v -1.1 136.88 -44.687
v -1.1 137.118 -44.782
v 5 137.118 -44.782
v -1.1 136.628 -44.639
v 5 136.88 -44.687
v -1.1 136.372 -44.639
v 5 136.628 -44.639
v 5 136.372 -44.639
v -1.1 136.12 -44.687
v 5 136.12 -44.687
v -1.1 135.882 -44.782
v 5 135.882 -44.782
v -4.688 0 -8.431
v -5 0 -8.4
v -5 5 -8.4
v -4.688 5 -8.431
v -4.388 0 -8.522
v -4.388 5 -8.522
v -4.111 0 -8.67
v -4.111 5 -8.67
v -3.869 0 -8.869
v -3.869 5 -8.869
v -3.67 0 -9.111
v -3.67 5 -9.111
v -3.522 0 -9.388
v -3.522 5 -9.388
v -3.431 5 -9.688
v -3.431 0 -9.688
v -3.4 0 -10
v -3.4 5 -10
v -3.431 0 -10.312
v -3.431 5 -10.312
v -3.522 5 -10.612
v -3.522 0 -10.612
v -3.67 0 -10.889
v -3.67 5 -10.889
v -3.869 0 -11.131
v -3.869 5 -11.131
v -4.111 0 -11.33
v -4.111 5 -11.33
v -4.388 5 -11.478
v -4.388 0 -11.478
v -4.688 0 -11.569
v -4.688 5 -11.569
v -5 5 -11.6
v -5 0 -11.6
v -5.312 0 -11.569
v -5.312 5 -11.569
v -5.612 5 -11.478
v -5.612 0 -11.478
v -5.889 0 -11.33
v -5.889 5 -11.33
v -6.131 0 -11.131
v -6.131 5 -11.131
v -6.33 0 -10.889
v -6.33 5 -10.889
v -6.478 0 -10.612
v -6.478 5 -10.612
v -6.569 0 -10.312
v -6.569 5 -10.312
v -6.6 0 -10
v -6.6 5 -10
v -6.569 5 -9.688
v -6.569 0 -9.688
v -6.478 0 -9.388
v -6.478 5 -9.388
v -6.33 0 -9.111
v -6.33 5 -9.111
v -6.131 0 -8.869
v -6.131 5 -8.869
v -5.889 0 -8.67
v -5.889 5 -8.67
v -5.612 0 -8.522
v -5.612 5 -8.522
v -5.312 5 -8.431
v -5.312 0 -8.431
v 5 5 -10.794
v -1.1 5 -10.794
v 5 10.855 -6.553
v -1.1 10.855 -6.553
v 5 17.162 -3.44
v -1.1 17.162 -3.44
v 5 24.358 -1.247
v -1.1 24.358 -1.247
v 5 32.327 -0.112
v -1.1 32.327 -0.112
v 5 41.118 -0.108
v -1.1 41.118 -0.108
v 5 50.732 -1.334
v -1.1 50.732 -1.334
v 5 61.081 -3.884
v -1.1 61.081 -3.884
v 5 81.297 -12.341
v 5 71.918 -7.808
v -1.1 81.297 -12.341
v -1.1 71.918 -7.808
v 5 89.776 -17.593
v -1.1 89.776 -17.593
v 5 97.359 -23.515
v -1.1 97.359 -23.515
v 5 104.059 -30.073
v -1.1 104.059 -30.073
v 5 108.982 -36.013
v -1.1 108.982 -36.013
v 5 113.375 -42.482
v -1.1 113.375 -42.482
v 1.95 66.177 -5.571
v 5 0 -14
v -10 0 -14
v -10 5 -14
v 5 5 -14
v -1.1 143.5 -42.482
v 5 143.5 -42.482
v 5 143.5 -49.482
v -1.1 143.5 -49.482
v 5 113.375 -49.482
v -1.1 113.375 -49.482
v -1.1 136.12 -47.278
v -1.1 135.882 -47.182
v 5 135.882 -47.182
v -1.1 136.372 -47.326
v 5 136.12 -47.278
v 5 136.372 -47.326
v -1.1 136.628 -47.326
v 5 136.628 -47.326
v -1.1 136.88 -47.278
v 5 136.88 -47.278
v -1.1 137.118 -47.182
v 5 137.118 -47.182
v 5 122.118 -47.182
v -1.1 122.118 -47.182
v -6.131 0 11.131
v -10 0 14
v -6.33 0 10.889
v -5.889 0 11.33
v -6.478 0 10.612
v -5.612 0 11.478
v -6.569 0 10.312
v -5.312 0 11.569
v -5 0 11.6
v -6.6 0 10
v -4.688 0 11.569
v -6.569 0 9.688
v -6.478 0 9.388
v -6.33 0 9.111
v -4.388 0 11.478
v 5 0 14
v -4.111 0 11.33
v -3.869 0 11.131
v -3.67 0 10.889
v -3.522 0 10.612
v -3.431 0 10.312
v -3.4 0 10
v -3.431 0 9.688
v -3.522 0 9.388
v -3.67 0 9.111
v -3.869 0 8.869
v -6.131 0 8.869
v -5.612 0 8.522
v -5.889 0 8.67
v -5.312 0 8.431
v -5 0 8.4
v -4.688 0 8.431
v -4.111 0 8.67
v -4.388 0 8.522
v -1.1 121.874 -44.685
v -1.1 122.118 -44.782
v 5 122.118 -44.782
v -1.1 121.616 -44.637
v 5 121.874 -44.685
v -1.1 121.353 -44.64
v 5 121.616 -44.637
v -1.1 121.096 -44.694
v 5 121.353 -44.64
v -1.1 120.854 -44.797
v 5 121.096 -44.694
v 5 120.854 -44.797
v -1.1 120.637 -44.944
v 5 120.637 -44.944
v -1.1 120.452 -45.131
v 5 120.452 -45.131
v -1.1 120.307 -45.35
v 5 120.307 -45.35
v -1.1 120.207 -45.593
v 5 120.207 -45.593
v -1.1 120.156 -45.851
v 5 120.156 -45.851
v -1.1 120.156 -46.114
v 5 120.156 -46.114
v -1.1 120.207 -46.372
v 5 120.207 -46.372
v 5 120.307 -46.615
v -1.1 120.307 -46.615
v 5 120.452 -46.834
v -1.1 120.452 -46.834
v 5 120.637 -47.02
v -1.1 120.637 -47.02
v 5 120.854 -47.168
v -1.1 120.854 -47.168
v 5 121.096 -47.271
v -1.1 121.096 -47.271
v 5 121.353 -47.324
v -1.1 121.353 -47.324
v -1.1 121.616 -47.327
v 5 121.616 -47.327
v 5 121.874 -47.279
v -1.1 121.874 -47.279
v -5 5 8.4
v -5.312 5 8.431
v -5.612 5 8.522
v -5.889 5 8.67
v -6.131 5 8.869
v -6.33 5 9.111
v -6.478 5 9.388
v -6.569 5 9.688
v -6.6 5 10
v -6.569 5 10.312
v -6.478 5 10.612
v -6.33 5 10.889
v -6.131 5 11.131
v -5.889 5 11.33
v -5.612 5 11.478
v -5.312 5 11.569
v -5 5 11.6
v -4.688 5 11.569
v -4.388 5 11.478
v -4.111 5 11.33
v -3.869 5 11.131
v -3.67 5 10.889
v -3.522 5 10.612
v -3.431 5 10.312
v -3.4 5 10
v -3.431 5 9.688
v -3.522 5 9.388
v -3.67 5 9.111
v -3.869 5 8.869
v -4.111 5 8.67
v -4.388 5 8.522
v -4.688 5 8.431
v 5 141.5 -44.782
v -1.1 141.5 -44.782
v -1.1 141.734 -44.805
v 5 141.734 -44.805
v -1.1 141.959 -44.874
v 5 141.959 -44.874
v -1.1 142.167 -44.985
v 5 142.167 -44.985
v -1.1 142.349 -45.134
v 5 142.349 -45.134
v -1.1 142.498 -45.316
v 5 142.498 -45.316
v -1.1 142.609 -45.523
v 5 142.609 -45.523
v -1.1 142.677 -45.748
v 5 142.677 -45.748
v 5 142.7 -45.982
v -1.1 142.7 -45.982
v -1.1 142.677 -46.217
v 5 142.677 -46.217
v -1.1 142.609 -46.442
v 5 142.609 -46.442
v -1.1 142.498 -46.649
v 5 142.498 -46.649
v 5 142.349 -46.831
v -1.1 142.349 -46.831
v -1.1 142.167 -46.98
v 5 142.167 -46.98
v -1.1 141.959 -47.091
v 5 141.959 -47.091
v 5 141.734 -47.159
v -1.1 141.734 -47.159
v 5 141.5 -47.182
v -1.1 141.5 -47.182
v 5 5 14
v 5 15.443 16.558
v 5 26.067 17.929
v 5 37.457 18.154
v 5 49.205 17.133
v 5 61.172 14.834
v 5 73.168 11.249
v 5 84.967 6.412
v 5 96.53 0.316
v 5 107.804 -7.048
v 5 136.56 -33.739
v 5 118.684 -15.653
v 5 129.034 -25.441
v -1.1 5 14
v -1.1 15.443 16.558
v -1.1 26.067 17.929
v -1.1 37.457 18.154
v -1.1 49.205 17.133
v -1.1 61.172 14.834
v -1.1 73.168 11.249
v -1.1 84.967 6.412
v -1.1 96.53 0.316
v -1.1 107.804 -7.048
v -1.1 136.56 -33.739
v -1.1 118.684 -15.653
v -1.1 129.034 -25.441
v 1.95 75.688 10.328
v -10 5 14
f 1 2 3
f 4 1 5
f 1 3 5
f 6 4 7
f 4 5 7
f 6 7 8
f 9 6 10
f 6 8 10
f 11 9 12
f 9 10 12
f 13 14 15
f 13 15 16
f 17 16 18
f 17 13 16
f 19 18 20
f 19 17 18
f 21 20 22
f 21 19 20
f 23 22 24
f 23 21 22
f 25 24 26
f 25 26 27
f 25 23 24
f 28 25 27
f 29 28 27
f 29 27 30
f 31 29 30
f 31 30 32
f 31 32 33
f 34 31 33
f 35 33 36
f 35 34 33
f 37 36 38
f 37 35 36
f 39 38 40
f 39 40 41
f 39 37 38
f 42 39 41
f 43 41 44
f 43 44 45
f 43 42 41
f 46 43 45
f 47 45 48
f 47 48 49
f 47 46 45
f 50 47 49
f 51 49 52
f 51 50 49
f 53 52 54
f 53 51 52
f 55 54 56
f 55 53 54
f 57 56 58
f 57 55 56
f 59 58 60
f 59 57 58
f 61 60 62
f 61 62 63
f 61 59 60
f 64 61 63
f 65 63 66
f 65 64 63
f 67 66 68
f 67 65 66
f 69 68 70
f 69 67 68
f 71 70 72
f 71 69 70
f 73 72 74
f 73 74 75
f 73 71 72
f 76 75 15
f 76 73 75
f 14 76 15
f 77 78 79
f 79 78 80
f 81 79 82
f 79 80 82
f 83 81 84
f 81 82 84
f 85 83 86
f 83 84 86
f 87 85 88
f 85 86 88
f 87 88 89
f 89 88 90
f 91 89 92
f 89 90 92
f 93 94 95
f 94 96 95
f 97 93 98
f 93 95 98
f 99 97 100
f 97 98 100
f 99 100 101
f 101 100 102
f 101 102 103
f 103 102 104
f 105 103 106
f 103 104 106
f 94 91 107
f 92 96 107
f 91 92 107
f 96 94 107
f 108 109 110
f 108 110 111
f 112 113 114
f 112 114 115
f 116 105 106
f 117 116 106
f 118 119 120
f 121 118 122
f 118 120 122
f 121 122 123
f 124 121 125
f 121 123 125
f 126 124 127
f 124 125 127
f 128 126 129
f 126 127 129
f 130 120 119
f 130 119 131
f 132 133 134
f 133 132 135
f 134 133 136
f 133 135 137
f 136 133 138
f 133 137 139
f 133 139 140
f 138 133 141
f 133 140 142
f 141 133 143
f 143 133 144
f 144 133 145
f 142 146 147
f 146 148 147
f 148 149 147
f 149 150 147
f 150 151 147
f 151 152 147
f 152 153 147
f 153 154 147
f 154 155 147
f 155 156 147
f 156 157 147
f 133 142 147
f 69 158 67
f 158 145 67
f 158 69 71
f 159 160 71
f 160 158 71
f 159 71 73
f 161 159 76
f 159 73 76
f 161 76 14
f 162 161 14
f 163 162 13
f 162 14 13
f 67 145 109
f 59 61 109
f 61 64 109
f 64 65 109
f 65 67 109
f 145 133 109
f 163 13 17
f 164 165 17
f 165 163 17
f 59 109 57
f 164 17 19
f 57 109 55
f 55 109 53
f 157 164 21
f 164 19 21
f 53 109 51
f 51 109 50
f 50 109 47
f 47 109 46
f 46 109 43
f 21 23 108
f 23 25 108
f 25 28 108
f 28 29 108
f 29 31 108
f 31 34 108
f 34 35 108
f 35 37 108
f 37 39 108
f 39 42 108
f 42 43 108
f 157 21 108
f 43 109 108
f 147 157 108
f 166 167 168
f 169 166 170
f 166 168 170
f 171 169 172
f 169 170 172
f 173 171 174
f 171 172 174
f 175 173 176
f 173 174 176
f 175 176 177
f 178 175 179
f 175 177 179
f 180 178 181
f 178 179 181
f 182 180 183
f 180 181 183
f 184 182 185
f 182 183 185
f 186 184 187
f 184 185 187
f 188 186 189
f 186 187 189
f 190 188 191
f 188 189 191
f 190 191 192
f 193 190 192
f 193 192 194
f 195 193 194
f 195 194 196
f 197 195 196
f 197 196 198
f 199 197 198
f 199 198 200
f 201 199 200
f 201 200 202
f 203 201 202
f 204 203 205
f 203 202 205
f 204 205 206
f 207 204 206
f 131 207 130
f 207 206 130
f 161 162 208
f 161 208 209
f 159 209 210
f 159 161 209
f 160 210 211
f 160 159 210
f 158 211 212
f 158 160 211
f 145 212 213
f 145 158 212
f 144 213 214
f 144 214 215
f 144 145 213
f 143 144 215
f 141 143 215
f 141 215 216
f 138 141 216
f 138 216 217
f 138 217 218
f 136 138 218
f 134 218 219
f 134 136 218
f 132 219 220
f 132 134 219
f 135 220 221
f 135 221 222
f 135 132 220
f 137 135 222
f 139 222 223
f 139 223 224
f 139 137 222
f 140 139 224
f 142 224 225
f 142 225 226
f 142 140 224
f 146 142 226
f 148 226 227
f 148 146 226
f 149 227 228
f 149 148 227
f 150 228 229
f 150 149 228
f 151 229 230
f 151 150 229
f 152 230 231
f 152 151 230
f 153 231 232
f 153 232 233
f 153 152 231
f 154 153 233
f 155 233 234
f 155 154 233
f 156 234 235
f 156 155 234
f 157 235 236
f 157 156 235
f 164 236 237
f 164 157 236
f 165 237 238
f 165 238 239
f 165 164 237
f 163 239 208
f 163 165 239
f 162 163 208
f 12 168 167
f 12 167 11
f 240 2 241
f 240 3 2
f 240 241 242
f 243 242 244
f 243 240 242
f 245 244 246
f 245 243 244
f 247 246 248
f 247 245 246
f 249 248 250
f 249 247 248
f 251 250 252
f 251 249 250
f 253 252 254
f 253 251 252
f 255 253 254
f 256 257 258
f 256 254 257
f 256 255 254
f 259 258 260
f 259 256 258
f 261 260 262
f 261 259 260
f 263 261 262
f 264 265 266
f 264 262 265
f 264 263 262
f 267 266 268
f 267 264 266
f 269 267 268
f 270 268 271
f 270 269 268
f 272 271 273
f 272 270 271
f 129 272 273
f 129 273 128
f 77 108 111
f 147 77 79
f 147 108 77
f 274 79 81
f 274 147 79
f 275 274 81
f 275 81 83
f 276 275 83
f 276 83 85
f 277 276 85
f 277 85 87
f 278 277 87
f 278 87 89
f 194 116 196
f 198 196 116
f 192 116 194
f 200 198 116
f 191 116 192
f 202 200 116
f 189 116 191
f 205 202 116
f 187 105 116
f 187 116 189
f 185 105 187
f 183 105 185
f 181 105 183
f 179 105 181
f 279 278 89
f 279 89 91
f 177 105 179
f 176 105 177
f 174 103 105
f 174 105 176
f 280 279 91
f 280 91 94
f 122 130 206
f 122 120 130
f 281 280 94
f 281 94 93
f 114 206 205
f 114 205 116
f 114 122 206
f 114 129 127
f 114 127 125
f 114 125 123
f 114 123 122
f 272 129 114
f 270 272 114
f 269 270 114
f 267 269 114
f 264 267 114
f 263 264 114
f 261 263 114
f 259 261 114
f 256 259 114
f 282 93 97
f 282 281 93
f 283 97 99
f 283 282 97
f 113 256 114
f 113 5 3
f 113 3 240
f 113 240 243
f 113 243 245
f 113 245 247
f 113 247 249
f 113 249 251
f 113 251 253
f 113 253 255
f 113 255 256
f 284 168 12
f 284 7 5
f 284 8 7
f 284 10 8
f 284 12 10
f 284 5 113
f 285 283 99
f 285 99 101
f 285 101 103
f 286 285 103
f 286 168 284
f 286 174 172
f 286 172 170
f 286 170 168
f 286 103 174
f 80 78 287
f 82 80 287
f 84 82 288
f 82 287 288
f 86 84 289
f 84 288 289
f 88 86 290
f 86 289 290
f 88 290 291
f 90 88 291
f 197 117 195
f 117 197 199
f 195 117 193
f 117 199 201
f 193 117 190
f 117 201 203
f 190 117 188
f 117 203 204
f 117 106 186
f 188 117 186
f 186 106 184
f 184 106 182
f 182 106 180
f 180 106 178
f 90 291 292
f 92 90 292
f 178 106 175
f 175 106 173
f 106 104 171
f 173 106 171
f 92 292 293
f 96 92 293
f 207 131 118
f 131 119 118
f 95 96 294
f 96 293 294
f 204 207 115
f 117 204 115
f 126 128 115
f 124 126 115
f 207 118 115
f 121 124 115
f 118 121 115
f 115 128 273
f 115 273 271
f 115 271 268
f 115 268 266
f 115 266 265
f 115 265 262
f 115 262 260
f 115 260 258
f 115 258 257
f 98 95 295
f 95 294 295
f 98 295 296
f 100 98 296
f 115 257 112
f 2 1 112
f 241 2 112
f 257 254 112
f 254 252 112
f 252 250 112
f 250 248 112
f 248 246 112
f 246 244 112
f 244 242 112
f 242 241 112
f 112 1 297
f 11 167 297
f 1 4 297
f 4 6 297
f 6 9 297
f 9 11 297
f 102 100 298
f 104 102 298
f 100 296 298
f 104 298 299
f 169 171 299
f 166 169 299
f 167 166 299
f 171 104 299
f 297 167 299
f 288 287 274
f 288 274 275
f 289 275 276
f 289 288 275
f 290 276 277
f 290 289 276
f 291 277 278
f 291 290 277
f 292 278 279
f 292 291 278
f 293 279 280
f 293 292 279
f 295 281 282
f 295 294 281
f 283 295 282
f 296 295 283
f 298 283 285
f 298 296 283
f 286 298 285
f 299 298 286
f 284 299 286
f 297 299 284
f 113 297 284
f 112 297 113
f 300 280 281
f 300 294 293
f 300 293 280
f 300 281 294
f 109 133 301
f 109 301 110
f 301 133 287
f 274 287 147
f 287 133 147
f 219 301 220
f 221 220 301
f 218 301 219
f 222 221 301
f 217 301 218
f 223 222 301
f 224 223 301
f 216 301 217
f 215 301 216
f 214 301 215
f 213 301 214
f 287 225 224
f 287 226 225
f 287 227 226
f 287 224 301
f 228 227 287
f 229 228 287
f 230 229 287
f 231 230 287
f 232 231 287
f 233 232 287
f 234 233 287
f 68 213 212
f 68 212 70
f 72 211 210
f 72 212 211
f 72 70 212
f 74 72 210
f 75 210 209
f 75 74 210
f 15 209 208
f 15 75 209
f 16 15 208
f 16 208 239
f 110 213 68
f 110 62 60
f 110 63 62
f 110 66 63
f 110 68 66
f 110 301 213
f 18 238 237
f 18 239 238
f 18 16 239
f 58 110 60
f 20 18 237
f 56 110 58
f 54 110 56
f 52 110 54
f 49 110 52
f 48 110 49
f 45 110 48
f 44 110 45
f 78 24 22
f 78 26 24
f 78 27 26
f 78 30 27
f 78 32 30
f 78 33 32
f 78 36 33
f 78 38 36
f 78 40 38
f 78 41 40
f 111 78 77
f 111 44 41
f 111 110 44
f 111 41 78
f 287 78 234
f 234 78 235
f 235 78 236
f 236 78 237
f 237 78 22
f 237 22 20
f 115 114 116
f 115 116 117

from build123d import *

# Parameters (mm, degrees)
SKETCH_1_W           = 20
SKETCH_1_H           = 28
SKETCH_1_R           = 1.6
EXTRUDE_1_DEPTH      = 5
EXTRUDE_2_DEPTH      = 5
EXTRUDE_2_DEPTH_BACK = 1.1
SKETCH_3_W           = 6.1
SKETCH_3_H           = 30.125226912
EXTRUDE_3_DEPTH      = 7
SKETCH_4_R           = 1.35
CUT_EXTRUDE_1_DEPTH  = 7
SKETCH_5_W           = 5
SKETCH_5_H           = 28
CUT_EXTRUDE_2_DEPTH  = 10
CUT_EXTRUDE_3_DEPTH  = 10


with BuildPart() as part:
    # 草图1 → 凸台-拉伸1 (new body)
    with BuildSketch(Plane(origin=(0, 0, 0), x_dir=(1, 0, 0), z_dir=(0, 1, 0))):
        Rectangle(SKETCH_1_W, SKETCH_1_H)
        with Locations(Location((-5, 10, 0), (0, 0, 270))):
            Circle(SKETCH_1_R, mode=Mode.SUBTRACT)
        with Locations(Location((-5, -10, 0), (0, 0, 90))):
            Circle(SKETCH_1_R, mode=Mode.SUBTRACT)
    extrude(amount=EXTRUDE_1_DEPTH)

    # 草图2 → 凸台-拉伸2 (add, two sides: drawn at the far end of the back side and taken through both)
    with BuildSketch(Plane(origin=(0, 0, 0), x_dir=(0, 0, -1), z_dir=(1, 0, 0)).offset(-EXTRUDE_2_DEPTH_BACK)):
        with BuildLine():
            Line((42.482395746, 143.5), (42.482395746, 113.374773088))
            add(Edge.make_bspline(
                [(10.794309538, 5), (-3.625508376, 21.700163207), (-0.038874902, 68.530494039), (24.786643579, 102.563540472), (42.482395746, 113.374773088)],
                knots=[0, 0, 0, 0, 0.510479212, 1, 1, 1, 1], degree=3))
            Line((10.794309538, 5), (-14, 5))
            add(Edge.make_bspline(
                [(-14, 5), (-21.090980053, 28.072383436), (-16.059602837, 83.599622922), (19.318940175, 126.307389699), (42.482395746, 143.5)],
                knots=[0, 0, 0, 0, 0.452386754, 1, 1, 1, 1], degree=3))
        make_face()
    extrude(amount=EXTRUDE_2_DEPTH + EXTRUDE_2_DEPTH_BACK)

    # 草图3 → 凸台-拉伸3 (add)
    with BuildSketch(Plane(origin=(0, 0, -42.482395746), x_dir=(-1, 0, 0), z_dir=(0, 0, -1))):
        with Locations((-1.95, 128.437386544)):
            Rectangle(SKETCH_3_W, SKETCH_3_H)
    extrude(amount=EXTRUDE_3_DEPTH)

    # 草图4 → 切除-拉伸1 (cut)
    with BuildSketch(Plane(origin=(5, 0, 0), x_dir=(0, 0, -1), z_dir=(1, 0, 0))):
        with Locations((45.982395746, 136.5)):
            Circle(SKETCH_4_R)
        with Locations((45.982395746, 121.5)):
            Circle(SKETCH_4_R)
    extrude(amount=-CUT_EXTRUDE_1_DEPTH, mode=Mode.SUBTRACT)

    # 草图5 → 切除-拉伸2 (cut)
    with BuildSketch(Plane(origin=(0, 5, 0), x_dir=(1, 0, 0), z_dir=(0, 1, 0))):
        with Locations((7.5, 0)):
            Rectangle(SKETCH_5_W, SKETCH_5_H)
    extrude(amount=-CUT_EXTRUDE_2_DEPTH, mode=Mode.SUBTRACT)

    # 草图6 → 切除-拉伸3 (cut)
    with BuildSketch(Plane(origin=(5, 0, 0), x_dir=(0, 0, -1), z_dir=(1, 0, 0))):
        with BuildLine():
            Line((44.782395746, 121.5), (44.782395746, 141.5))
            ThreePointArc((44.782395746, 141.5), (45.982395746, 142.7), (47.182395746, 141.5))
            Line((47.182395746, 141.5), (47.182395746, 121.5))
            ThreePointArc((47.182395746, 121.5), (45.982395746, 120.3), (44.782395746, 121.5))
        make_face()
    extrude(amount=-CUT_EXTRUDE_3_DEPTH, mode=Mode.SUBTRACT)


solid = part.part
